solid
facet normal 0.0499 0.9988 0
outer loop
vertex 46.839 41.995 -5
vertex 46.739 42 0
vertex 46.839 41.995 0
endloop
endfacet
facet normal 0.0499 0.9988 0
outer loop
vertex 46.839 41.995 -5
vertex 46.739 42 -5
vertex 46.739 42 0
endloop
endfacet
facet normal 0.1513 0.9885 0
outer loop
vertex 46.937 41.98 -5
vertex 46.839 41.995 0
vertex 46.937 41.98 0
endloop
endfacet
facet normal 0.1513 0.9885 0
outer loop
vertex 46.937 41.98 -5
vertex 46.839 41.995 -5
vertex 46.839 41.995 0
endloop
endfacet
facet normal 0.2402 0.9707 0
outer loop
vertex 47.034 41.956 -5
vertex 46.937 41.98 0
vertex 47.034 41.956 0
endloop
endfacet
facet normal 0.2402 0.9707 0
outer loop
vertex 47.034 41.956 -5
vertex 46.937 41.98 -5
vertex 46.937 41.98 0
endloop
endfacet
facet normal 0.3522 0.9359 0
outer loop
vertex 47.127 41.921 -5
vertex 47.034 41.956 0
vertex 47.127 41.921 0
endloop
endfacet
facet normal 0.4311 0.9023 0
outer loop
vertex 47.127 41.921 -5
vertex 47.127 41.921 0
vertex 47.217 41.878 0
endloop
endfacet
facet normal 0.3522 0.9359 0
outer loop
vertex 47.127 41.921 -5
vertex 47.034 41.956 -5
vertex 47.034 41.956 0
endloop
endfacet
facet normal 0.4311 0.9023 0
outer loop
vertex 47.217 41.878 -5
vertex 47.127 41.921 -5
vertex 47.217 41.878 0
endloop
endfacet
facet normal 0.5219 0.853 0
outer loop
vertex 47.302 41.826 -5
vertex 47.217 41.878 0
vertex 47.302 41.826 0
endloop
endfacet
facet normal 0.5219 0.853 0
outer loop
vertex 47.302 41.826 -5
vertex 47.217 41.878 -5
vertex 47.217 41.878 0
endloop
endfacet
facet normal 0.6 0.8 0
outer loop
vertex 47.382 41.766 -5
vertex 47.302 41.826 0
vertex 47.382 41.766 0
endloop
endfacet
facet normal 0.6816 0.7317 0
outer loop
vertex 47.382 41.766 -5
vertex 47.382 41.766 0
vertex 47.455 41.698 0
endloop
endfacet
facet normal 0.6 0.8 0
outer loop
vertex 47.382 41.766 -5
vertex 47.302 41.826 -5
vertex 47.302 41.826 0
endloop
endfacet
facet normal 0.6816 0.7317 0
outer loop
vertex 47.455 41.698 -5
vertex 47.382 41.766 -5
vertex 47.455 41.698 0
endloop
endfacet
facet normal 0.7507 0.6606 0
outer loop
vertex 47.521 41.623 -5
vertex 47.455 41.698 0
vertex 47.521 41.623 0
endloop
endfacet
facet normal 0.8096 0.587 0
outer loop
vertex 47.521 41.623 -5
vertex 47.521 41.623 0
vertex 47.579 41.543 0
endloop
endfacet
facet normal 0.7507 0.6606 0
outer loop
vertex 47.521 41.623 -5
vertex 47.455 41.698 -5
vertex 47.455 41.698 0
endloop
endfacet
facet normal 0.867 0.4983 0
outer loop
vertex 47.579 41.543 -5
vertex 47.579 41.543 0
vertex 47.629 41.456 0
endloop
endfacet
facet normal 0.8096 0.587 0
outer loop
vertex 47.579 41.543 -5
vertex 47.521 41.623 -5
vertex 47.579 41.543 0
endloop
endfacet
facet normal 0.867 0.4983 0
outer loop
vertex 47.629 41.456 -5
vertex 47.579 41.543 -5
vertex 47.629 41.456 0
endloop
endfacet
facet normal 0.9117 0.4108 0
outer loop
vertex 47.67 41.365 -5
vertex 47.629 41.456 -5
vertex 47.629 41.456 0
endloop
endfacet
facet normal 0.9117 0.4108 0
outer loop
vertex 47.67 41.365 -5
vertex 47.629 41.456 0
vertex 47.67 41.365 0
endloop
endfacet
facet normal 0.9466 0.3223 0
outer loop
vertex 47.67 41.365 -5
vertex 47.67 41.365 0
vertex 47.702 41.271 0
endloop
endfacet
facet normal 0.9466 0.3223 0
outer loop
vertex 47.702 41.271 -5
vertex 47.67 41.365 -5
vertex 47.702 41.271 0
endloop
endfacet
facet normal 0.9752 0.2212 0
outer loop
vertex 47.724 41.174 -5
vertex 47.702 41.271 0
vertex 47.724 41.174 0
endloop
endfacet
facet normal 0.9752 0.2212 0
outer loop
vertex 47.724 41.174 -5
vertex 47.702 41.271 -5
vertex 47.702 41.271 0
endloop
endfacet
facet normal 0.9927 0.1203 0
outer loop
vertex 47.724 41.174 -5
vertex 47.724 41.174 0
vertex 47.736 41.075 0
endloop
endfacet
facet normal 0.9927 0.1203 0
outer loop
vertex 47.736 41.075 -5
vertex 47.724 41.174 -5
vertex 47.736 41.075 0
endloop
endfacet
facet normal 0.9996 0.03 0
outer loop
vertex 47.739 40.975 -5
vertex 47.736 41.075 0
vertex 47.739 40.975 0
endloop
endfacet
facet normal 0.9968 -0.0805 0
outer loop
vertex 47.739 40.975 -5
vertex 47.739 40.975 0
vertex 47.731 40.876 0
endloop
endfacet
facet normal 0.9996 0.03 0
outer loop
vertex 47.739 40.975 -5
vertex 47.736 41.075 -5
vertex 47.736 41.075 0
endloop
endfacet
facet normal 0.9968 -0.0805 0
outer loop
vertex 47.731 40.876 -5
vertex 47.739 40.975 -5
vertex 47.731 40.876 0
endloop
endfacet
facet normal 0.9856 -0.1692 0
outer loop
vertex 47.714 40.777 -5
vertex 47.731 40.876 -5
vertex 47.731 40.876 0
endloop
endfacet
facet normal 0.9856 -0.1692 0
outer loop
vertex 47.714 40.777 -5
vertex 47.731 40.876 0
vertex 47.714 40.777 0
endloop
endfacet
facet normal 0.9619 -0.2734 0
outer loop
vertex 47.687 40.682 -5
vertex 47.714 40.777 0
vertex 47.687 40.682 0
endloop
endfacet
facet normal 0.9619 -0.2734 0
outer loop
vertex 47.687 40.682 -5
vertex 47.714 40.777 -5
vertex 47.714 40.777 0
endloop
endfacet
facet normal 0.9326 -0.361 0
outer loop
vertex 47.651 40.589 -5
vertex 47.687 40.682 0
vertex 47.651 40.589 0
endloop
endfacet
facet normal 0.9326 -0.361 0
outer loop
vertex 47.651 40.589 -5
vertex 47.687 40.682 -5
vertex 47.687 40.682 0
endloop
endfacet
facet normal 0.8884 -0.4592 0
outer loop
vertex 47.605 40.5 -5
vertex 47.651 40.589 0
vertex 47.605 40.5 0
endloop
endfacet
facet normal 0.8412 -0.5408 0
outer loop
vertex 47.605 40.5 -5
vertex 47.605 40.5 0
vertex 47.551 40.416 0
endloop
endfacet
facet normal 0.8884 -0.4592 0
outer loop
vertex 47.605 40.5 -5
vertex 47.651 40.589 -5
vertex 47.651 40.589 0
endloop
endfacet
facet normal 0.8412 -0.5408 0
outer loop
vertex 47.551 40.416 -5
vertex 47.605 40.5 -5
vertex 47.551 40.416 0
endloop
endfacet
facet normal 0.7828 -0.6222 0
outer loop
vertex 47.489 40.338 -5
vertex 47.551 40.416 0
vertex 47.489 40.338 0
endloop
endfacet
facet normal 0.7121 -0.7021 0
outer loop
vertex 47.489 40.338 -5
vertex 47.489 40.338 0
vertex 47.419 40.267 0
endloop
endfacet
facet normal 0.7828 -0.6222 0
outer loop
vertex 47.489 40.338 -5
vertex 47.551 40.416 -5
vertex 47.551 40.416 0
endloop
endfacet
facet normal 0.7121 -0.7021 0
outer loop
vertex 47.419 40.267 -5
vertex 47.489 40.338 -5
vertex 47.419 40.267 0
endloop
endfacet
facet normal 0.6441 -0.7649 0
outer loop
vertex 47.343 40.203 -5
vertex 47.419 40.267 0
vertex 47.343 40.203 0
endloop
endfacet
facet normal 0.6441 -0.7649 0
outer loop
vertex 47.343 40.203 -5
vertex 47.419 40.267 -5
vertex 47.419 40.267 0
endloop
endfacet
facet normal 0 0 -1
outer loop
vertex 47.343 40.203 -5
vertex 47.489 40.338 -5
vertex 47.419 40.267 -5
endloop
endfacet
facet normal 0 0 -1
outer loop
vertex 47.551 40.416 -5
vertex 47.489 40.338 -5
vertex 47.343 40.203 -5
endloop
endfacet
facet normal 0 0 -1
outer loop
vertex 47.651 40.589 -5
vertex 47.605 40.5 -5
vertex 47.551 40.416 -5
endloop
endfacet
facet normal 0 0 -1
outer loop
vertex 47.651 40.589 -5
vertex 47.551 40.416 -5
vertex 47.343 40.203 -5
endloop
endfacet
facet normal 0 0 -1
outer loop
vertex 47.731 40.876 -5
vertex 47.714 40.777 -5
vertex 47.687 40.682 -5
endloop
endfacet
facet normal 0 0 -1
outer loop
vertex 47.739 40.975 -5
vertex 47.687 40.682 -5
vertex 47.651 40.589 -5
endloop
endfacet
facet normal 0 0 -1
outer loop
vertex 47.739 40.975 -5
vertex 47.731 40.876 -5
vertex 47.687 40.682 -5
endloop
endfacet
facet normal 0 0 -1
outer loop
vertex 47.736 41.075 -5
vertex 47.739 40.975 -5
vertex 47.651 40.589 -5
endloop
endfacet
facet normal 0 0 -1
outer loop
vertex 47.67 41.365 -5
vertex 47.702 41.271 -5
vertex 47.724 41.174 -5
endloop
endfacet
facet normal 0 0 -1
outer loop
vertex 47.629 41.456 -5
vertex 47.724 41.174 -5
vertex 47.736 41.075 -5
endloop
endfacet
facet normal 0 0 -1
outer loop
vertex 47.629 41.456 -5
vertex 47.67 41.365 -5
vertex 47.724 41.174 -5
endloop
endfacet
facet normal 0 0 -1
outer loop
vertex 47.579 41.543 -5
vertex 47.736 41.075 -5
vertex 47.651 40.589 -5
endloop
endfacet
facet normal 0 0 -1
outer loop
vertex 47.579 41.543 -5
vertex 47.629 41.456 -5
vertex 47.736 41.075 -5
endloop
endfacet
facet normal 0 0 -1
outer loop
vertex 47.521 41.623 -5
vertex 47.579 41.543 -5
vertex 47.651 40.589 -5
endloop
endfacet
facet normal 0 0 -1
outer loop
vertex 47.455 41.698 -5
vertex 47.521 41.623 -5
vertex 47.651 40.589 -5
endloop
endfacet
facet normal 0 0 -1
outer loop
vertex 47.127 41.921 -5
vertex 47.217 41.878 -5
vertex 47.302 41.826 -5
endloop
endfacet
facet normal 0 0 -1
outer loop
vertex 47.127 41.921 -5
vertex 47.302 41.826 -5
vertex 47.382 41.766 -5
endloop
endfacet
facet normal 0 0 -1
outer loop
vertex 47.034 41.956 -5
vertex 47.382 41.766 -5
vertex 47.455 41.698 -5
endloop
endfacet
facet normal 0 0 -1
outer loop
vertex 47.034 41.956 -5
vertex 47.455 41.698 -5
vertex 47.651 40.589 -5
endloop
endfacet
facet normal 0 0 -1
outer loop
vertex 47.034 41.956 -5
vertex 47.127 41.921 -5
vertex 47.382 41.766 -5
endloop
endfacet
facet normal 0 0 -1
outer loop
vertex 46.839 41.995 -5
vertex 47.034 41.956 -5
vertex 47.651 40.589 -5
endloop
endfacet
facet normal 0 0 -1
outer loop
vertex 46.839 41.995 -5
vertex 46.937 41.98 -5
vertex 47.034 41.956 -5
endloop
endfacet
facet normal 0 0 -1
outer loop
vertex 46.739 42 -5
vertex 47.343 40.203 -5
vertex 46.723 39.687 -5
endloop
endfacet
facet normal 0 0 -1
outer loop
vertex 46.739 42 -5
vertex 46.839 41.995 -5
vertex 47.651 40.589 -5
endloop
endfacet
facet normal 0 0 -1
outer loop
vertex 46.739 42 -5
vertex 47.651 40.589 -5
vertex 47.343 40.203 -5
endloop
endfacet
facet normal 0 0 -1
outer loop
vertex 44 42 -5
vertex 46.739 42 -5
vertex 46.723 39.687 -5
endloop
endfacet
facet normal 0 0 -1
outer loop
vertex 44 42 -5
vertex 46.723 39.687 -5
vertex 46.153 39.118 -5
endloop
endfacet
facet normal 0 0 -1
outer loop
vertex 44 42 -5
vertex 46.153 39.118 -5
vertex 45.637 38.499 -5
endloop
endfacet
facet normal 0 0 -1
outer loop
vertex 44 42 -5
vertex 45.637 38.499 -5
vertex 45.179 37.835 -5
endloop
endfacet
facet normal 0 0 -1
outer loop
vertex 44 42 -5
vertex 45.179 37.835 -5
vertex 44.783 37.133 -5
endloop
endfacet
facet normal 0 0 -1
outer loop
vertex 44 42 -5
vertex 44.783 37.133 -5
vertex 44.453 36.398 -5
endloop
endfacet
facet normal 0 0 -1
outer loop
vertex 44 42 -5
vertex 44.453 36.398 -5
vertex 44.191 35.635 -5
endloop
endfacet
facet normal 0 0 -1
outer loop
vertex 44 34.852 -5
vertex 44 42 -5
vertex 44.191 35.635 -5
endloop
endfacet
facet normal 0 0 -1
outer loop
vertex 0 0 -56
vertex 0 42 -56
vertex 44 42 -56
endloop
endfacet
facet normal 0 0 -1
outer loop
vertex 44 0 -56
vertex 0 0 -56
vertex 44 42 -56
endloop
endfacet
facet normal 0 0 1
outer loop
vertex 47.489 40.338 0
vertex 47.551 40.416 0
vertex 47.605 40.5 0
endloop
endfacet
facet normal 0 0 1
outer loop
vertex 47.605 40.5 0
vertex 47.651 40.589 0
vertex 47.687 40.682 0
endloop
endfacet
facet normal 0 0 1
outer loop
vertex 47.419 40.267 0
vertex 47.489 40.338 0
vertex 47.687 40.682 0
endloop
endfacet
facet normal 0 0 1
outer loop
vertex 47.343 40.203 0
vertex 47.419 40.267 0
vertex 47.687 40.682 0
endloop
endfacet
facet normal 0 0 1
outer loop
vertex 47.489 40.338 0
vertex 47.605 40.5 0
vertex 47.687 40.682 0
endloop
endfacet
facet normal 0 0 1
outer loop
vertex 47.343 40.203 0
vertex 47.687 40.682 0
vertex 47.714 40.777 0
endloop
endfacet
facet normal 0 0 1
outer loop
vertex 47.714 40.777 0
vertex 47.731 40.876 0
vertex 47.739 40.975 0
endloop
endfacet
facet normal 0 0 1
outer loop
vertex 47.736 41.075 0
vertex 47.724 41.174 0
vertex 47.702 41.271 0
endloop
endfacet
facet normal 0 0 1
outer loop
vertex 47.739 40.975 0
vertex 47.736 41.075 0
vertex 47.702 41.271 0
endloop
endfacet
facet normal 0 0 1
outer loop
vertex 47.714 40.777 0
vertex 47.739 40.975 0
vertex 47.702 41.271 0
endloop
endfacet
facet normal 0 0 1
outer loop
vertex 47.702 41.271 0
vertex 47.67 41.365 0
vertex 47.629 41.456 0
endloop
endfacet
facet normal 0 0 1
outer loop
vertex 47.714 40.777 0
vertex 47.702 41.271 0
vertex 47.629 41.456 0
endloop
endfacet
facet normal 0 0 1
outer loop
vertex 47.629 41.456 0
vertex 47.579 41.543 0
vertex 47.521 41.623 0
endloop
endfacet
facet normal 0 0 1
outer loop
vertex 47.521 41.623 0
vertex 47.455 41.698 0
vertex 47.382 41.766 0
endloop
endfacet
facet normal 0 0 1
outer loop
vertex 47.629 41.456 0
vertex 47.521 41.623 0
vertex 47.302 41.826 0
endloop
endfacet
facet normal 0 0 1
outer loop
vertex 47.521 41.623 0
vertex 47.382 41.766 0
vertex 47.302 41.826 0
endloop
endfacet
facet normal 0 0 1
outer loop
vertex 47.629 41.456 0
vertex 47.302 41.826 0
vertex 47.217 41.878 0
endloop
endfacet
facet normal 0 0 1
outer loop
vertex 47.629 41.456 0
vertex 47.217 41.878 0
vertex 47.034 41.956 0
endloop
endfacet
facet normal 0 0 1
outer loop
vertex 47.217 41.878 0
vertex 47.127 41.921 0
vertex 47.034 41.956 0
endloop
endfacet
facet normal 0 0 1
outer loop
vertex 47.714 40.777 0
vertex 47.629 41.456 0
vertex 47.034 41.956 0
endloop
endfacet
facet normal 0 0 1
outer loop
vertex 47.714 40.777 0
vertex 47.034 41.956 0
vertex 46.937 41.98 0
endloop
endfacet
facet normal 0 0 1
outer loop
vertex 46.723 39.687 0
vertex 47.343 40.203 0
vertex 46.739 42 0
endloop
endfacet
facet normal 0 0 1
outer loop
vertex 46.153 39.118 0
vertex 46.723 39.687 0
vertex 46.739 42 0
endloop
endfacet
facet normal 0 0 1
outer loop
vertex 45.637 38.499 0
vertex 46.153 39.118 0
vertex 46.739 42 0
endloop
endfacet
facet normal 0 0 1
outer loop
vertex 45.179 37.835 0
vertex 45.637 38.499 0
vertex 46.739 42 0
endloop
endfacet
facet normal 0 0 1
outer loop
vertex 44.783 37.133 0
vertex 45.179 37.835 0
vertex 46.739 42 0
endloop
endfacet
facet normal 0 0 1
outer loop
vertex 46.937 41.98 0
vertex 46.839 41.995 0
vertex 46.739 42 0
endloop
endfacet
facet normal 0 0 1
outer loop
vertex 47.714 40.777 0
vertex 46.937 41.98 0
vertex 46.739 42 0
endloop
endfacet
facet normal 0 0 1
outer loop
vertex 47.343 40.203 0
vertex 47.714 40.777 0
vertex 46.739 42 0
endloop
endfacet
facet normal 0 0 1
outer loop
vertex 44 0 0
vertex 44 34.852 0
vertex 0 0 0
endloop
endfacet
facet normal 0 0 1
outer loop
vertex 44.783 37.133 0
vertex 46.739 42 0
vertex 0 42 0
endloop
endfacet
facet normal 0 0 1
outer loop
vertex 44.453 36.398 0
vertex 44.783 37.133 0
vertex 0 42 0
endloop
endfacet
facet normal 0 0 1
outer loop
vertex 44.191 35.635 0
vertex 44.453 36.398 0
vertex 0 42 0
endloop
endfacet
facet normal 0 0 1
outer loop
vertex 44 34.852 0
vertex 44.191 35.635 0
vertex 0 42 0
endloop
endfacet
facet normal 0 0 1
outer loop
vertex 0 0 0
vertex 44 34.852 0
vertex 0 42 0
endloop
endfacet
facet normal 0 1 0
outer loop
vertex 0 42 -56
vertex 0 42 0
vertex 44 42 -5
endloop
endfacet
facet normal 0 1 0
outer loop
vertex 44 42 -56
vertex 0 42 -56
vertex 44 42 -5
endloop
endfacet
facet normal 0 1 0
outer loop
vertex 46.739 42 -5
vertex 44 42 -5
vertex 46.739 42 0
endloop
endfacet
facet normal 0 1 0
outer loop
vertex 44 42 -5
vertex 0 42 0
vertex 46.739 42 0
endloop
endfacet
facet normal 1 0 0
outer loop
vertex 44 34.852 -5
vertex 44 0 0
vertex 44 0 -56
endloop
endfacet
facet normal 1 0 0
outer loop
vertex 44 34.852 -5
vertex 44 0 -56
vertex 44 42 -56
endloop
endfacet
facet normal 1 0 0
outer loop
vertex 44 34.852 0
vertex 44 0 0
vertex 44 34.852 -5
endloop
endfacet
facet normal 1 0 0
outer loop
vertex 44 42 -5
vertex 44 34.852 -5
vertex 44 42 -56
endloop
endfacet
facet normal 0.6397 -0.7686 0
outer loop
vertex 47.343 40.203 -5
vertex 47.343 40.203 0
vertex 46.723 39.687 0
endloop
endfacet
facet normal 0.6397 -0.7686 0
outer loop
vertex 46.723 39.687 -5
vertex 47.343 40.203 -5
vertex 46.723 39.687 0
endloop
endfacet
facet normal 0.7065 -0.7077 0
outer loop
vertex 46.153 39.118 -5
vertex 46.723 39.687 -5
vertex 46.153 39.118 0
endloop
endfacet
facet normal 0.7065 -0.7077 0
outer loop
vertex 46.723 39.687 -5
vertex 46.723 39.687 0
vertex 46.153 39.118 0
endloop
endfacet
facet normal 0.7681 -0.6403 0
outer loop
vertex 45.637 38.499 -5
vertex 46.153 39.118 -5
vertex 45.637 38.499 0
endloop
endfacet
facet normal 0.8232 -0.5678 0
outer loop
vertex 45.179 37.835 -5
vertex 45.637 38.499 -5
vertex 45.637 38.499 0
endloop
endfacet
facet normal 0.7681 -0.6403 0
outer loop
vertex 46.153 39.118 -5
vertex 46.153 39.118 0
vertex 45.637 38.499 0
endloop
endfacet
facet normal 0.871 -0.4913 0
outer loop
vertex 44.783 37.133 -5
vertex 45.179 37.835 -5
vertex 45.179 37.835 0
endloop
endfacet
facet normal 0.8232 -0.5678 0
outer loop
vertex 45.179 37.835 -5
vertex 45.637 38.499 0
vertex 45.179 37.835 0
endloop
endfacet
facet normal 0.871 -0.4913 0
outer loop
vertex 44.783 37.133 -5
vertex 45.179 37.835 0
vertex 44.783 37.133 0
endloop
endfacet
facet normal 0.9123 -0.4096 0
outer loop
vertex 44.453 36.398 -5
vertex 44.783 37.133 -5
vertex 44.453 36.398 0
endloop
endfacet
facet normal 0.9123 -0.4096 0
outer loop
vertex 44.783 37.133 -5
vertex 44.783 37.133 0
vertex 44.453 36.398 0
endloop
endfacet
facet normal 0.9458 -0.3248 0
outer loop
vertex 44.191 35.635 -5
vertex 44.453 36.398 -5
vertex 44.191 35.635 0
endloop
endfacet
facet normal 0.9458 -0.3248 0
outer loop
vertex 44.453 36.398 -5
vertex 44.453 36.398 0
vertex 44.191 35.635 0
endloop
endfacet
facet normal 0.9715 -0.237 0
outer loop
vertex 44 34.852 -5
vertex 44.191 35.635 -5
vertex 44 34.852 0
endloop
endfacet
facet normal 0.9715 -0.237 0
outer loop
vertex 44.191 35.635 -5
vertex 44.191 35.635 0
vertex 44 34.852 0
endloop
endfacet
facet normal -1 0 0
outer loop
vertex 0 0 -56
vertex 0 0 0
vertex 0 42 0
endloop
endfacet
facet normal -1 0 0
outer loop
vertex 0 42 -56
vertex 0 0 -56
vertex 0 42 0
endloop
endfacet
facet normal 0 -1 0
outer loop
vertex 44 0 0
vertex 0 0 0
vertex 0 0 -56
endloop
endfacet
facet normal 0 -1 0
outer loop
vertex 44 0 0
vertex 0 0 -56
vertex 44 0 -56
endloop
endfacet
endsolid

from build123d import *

# Parameters (mm, degrees)
SKETCH1_W           = 44
SKETCH1_H           = 42
BOSS_EXTRUDE1_DEPTH = 56
BOSS_EXTRUDE2_DEPTH = 5
FILLET1_R           = 1


with BuildPart() as part:
    # Sketch1 → Boss-Extrude1 (new body)
    with BuildSketch(Plane.XY):
        with Locations((22, 21)):
            Rectangle(SKETCH1_W, SKETCH1_H)
    extrude(amount=-BOSS_EXTRUDE1_DEPTH)

    # Sketch2 → Boss-Extrude2 (add)
    with BuildSketch(Plane.XY):
        with BuildLine():
            Line((44, 42), (52.691651223, 42))
            ThreePointArc((52.691651223, 42), (47.065035319, 39.983558931), (44, 34.852243348))
            Line((44, 34.852243348), (44, 42))
        make_face()
    extrude(amount=-BOSS_EXTRUDE2_DEPTH)

    # Fillet1
    fillet1_edges = [part.edges().sort_by_distance(p)[0] for p in [
        (52.691651223, 42, -2.5),
    ]]
    fillet(fillet1_edges, radius=FILLET1_R)


solid = part.part
